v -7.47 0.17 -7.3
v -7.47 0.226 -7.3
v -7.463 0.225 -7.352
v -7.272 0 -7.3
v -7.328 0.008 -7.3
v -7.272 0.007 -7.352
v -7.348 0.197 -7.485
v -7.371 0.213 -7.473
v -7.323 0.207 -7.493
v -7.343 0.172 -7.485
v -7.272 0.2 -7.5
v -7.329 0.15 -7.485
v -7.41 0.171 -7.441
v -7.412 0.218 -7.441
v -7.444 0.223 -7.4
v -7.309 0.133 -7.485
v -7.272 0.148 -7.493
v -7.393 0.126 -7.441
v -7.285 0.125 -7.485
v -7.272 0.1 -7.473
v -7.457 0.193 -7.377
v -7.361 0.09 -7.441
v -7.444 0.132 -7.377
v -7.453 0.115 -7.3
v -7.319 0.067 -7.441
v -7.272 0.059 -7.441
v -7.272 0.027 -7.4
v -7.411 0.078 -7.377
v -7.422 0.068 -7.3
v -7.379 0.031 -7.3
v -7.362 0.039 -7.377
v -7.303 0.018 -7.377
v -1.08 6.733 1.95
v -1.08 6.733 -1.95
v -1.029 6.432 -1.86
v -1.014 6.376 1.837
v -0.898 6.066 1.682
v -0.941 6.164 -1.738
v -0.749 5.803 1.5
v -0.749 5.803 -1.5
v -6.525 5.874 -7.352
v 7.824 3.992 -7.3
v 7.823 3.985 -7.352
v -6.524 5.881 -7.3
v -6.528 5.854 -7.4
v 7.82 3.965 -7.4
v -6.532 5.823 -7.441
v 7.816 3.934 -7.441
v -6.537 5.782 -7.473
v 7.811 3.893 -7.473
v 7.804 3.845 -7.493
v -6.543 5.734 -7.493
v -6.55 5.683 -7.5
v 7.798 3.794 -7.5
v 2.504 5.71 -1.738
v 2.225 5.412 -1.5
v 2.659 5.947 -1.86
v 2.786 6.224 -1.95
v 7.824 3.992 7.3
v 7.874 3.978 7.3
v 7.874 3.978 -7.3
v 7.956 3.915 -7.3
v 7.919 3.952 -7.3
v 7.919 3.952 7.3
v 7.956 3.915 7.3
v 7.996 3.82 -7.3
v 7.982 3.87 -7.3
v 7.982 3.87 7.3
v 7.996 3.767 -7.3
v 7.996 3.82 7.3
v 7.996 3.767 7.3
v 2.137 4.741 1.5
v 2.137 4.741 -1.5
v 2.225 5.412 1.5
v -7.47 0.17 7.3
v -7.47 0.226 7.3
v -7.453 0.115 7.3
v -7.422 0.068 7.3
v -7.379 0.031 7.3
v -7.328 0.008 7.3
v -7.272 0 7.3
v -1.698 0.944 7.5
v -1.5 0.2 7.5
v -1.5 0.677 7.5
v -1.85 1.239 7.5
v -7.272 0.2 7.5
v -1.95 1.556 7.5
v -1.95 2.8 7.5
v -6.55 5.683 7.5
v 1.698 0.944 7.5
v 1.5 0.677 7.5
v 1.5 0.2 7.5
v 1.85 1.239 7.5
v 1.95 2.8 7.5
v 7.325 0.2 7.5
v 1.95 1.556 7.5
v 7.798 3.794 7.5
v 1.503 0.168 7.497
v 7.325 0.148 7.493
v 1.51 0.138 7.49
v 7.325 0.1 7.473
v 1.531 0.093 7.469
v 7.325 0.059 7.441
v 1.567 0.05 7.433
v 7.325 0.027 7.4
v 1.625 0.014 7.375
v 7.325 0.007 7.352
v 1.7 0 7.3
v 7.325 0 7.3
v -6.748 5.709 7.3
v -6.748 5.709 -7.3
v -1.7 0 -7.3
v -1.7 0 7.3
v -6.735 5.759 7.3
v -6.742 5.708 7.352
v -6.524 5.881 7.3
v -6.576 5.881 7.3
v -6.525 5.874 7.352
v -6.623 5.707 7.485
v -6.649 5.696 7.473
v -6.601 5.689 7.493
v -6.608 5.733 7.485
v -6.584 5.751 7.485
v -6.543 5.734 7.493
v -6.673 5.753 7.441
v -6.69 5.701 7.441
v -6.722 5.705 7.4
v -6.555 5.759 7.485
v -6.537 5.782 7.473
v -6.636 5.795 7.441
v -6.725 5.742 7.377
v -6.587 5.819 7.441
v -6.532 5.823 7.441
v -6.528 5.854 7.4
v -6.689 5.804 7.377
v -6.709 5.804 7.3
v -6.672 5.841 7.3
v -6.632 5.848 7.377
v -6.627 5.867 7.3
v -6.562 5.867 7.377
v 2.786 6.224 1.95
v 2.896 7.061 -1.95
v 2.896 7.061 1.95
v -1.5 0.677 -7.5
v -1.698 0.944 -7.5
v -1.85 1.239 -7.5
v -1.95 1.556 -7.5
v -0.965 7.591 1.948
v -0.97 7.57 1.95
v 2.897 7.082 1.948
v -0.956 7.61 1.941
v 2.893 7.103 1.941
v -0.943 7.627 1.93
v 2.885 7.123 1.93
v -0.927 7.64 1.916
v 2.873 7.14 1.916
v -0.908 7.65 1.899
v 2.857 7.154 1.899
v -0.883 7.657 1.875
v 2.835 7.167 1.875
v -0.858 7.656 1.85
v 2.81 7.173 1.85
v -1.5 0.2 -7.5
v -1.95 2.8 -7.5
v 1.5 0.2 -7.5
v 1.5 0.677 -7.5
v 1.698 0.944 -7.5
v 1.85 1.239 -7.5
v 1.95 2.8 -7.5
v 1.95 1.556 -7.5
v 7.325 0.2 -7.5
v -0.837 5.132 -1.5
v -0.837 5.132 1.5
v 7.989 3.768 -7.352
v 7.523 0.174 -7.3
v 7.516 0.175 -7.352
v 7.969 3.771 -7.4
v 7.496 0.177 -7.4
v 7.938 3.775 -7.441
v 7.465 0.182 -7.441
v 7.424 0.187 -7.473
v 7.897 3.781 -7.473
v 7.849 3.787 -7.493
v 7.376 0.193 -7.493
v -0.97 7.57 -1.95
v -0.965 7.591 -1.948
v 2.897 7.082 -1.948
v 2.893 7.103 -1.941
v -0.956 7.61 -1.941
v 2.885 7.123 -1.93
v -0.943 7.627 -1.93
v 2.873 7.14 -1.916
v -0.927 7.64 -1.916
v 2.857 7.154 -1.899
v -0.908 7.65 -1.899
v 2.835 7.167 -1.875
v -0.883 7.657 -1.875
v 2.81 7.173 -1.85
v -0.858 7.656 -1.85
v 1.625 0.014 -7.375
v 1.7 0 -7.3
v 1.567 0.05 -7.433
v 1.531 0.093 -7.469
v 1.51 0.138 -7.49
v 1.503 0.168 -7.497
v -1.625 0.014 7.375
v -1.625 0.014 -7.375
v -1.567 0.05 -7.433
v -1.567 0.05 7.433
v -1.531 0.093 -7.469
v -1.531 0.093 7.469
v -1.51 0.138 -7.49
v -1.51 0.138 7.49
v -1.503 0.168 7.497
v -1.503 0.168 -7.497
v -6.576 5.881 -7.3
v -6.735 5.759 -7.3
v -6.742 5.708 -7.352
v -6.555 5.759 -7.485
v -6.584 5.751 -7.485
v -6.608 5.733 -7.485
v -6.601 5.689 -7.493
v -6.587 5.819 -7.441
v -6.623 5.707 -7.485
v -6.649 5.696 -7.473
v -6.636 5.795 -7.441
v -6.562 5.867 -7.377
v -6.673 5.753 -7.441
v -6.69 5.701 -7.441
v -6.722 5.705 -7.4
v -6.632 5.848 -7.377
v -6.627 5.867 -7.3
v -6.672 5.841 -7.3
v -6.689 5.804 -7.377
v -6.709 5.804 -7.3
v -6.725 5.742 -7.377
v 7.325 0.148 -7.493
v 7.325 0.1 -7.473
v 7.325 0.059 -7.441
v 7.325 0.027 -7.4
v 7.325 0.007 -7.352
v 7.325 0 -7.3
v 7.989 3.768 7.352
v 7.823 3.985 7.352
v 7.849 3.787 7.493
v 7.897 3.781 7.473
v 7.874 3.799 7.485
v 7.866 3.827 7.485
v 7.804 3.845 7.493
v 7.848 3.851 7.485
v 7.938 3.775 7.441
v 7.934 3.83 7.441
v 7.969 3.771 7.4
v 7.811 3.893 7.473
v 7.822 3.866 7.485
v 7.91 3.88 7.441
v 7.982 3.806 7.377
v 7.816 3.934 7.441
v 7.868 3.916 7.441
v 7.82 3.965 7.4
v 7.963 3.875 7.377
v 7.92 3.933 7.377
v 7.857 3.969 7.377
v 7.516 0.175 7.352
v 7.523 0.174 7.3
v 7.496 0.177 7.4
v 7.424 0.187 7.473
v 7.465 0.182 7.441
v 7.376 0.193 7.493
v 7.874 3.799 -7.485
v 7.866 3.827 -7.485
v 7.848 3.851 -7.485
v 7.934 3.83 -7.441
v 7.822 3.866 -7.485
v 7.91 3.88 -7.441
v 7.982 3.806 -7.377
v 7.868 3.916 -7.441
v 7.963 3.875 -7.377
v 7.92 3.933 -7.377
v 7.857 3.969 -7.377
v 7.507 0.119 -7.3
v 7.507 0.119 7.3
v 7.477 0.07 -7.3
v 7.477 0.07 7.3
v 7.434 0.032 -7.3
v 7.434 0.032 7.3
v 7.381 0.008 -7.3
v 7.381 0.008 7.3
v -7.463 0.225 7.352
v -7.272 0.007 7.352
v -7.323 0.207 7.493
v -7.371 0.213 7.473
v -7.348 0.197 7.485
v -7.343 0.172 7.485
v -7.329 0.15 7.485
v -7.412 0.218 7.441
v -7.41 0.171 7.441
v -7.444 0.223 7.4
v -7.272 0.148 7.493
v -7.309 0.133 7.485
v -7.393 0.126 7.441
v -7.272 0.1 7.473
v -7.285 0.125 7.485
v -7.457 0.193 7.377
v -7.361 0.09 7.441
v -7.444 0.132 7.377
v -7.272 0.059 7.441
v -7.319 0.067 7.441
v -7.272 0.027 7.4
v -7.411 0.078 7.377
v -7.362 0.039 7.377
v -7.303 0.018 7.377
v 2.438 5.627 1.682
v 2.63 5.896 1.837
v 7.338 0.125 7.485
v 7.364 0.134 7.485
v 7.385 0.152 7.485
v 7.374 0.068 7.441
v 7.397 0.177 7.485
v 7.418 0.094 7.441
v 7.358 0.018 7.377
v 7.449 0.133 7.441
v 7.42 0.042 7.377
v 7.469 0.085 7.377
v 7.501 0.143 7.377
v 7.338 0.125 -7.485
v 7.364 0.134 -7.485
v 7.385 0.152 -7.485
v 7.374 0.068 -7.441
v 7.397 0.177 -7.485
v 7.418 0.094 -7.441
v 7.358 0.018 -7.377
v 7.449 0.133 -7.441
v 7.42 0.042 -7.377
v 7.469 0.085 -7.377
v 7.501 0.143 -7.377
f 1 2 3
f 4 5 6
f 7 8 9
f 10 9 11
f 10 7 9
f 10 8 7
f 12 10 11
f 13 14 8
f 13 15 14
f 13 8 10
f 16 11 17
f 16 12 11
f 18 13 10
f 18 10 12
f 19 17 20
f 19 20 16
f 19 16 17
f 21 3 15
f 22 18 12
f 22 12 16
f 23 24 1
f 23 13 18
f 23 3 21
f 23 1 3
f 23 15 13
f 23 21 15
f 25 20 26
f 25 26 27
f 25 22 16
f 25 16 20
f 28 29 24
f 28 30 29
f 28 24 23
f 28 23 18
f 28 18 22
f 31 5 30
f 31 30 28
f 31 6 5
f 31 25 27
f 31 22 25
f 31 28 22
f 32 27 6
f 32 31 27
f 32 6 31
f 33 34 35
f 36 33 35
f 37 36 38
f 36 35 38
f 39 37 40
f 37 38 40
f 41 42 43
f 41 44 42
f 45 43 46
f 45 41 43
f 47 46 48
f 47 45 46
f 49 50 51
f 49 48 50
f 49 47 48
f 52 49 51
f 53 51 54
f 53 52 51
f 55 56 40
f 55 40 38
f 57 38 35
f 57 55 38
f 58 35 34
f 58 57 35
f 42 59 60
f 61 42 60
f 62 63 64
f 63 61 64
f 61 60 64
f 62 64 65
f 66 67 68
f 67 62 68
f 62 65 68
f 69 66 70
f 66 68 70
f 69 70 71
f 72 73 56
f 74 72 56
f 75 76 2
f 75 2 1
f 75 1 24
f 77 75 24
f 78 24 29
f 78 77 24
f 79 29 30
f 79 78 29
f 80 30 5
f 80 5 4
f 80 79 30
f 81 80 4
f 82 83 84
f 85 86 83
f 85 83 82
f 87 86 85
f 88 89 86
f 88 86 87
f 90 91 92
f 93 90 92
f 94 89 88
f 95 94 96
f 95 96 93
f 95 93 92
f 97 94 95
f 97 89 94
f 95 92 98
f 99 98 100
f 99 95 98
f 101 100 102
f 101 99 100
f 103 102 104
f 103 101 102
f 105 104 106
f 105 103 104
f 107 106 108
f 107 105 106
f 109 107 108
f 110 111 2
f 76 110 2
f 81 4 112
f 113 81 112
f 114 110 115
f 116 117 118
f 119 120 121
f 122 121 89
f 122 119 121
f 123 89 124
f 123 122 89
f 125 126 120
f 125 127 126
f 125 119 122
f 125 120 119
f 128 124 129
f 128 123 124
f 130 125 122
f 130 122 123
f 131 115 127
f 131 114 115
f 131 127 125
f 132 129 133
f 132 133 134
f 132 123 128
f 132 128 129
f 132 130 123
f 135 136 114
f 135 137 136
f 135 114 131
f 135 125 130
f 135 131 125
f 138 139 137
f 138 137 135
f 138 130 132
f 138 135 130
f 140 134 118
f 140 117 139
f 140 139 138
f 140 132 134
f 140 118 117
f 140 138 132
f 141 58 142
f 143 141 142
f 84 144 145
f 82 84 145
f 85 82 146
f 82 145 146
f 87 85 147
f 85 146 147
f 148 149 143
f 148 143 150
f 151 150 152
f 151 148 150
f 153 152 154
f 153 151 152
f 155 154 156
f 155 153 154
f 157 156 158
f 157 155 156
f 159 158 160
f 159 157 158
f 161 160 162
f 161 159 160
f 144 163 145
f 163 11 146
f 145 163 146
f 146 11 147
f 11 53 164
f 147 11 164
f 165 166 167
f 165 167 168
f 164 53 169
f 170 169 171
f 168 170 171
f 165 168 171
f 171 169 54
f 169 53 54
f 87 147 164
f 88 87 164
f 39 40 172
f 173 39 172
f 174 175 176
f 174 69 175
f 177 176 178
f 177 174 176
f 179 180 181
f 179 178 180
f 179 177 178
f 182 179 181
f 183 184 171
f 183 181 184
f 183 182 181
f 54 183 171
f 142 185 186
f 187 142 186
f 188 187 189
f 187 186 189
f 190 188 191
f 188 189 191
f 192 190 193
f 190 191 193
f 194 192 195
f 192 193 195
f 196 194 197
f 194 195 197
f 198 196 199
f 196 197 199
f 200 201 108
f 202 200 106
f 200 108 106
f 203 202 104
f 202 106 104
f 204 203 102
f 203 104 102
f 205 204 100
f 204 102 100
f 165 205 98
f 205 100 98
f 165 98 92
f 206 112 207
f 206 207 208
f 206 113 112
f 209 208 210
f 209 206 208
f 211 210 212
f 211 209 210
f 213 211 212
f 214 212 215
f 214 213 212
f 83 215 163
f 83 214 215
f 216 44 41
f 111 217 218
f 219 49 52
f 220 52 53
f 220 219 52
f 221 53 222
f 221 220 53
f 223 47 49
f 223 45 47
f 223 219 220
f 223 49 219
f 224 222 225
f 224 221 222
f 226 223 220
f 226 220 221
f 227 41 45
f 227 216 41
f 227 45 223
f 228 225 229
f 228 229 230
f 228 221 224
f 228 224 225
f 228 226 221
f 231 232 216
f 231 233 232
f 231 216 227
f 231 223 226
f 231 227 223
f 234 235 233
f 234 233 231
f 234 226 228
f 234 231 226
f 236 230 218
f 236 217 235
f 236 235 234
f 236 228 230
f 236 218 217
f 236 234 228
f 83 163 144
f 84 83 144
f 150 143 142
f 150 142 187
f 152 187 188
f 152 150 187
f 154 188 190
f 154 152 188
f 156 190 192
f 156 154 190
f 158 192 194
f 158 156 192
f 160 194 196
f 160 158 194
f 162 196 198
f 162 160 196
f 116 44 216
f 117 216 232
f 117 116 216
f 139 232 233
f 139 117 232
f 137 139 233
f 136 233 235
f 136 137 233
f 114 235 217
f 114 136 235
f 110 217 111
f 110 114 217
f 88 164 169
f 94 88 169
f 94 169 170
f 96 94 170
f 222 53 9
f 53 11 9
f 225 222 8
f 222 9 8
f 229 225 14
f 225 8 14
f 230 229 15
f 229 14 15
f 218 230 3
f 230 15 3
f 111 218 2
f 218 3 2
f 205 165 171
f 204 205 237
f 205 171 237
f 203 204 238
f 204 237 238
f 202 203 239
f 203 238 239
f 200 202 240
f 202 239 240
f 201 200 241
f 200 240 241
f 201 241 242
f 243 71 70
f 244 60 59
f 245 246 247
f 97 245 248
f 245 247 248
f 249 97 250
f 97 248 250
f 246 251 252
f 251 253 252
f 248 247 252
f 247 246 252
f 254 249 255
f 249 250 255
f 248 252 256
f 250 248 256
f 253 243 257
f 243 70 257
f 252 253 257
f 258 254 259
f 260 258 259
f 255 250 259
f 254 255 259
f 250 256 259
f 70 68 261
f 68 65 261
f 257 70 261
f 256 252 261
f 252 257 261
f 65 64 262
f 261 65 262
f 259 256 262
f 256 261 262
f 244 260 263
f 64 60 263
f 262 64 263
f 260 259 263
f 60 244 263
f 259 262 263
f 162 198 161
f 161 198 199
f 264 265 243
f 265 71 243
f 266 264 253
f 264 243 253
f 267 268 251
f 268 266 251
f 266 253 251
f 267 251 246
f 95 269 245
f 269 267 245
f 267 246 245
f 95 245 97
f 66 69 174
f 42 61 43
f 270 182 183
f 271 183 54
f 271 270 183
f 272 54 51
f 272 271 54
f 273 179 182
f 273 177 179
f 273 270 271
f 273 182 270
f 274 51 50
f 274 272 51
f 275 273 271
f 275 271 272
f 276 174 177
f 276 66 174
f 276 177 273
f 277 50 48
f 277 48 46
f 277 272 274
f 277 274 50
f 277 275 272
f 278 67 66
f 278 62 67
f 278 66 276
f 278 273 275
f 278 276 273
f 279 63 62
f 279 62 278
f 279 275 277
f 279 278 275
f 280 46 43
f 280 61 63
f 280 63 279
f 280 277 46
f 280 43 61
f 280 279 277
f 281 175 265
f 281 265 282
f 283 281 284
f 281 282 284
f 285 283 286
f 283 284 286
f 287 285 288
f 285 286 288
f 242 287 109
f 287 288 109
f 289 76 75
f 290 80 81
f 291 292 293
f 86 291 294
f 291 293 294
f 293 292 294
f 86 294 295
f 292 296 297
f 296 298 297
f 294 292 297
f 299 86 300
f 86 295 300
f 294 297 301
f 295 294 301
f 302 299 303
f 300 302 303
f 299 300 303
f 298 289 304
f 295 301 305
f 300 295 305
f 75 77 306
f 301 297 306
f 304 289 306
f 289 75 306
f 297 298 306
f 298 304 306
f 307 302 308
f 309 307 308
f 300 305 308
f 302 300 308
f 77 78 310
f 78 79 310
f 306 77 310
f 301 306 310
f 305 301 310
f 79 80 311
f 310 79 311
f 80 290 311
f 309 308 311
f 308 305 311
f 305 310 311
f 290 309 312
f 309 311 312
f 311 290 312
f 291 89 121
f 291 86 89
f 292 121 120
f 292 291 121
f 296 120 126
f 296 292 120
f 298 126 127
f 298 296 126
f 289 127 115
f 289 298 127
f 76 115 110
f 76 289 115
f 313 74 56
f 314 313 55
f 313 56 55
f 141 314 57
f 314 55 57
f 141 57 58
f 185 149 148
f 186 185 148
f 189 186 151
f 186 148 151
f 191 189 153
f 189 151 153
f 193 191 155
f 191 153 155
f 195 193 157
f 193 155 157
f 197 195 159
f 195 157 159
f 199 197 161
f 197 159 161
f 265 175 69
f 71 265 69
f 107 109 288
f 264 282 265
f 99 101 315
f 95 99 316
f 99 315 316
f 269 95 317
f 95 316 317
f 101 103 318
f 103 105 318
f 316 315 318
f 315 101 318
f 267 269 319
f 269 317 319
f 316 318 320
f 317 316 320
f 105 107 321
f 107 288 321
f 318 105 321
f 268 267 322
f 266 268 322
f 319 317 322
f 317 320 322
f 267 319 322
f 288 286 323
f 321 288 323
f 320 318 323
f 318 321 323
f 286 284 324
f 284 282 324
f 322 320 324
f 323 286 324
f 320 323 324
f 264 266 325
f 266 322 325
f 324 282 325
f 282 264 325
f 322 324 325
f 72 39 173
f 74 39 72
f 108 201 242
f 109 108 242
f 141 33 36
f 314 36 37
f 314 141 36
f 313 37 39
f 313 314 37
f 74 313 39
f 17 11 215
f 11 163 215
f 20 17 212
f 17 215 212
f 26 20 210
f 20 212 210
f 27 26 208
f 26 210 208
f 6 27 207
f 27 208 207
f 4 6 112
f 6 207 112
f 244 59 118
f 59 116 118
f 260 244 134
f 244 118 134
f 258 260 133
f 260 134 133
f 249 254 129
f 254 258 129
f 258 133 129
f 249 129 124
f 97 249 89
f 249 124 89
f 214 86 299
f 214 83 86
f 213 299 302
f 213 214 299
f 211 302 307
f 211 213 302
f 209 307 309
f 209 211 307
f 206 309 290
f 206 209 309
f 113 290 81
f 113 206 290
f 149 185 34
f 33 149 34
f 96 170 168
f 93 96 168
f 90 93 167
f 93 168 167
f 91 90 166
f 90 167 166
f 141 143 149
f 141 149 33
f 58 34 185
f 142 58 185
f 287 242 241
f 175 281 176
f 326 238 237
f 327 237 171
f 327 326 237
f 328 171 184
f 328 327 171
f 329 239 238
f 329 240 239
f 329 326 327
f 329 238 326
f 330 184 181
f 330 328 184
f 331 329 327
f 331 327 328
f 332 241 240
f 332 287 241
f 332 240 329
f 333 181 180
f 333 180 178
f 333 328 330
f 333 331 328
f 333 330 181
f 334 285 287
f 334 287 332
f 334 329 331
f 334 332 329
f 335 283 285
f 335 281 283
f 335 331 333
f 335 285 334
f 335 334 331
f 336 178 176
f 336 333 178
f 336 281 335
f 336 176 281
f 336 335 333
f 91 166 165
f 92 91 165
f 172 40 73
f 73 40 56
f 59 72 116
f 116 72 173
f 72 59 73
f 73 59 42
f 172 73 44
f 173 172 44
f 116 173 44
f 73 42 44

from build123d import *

# Parameters (mm, degrees)
EXTRUDE_1_DEPTH      = 7.5
EXTRUDE_1_DEPTH_BACK = 7.5
EXTRUDE_2_DEPTH      = 1.5
EXTRUDE_2_DEPTH_BACK = 1.5
EXTRUDE_3_DEPTH      = 2
EXTRUDE_3_DEPTH_BACK = 2
CUT_EXTRUDE_1_DEPTH  = 15.42315829
FILLET_1_R           = 0.2
FILLET_2_R           = 0.1


with BuildPart() as part:
    # 草图1 → 凸台-拉伸1 (new, two sides: drawn at the far end of the back side and taken through both)
    with BuildSketch(Plane.XY.offset(-EXTRUDE_1_DEPTH_BACK)):
        with BuildLine():
            Line((-7.5, 0), (-1.5, 0))
            Line((-1.5, 0), (-1.5, 0.677124344))
            ThreePointArc((-1.5, 0.677124344), (-1.780042303, 1.088161527), (-1.95, 1.555590279))
            Line((-1.95, 1.555590279), (-1.95, 2.8))
            Line((-1.95, 2.8), (1.95, 2.8))
            Line((1.95, 2.8), (1.95, 1.555590279))
            ThreePointArc((1.95, 1.555590279), (1.780042303, 1.088161527), (1.5, 0.677124344))
            Line((1.5, 0.677124344), (1.5, 0))
            Line((1.5, 0), (7.5, 0))
            Line((7.5, 0), (8.022104769, 3.965779445))
            Line((8.022104769, 3.965779445), (-6.722338928, 5.906922284))
            Line((-6.722338928, 5.906922284), (-7.5, 0))
        make_face()
    extrude(amount=EXTRUDE_1_DEPTH + EXTRUDE_1_DEPTH_BACK)

    # 草图2 → 凸台-拉伸2 (add, two sides: drawn at the far end of the back side and taken through both)
    with BuildSketch(Plane.XY.offset(-EXTRUDE_2_DEPTH_BACK)):
        Polygon((-0.837284372, 5.132140153), (2.137050212, 4.740561576), (2.267576405, 5.732006438), (-0.70675818, 6.123585014), align=None)
    extrude(amount=EXTRUDE_2_DEPTH + EXTRUDE_2_DEPTH_BACK)

    # 草图3 → 凸台-拉伸3 (add, two sides: drawn at the far end of the back side and taken through both)
    with BuildSketch(Plane.XY.offset(-EXTRUDE_3_DEPTH_BACK)):
        with BuildLine():
            Line((-0.957119079, 7.669489093), (-1.080389284, 6.733158928))
            ThreePointArc((-1.080389284, 6.733158928), (-0.972897293, 6.247545163), (-0.748901909, 5.803471605))
            Line((-0.748901909, 5.803471605), (2.225432675, 5.411893028))
            ThreePointArc((2.225432675, 5.411893028), (2.556730295, 5.782860875), (2.786245676, 6.224106778))
            Line((2.786245676, 6.224106778), (2.909515881, 7.160436943))
            Line((2.909515881, 7.160436943), (-0.957119079, 7.669489093))
        make_face()
    extrude(amount=EXTRUDE_3_DEPTH + EXTRUDE_3_DEPTH_BACK)

    # 草图4 → 切除-拉伸1 (cut, through all)
    with BuildSketch(Plane(origin=(1.93331748, -0.254526075, 0), x_dir=(0, 0, -1), z_dir=(0.9914448613738126, -0.13052619222003545, 0))):
        with BuildLine():
            Line((1.95, 7.478946442), (2, 7.478946442))
            Line((2, 7.478946442), (2, 5.656070786))
            Line((2, 5.656070786), (1.5, 5.656070786))
            ThreePointArc((1.5, 5.656070786), (1.780042303, 6.067107969), (1.95, 6.534536721))
            Line((1.95, 6.534536721), (1.95, 7.478946442))
        make_face()
        with BuildLine():
            Line((-1.95, 7.478946442), (-1.95, 6.534536721))
            ThreePointArc((-1.95, 6.534536721), (-1.780042303, 6.067107969), (-1.5, 5.656070786))
            Line((-1.5, 5.656070786), (-2, 5.656070786))
            Line((-2, 5.656070786), (-2, 7.478946442))
            Line((-2, 7.478946442), (-1.95, 7.478946442))
        make_face()
    extrude(amount=-CUT_EXTRUDE_1_DEPTH, mode=Mode.SUBTRACT)

    # 圆角1
    fillet_1_edges = [part.edges().sort_by_distance(p)[0] for p in [
        (-6.722338928, 5.906922284, 0),
        (8.022104769, 3.965779445, 0),
        (7.5, 0, 0),
        (1.5, 0, 0),
        (-1.5, 0, 0),
        (-7.5, 0, 0),
        (4.5, 0, -7.5),
        (-7.111169464, 2.953461142, 7.5),
        (-4.5, 0, 7.5),
        (7.761052384, 1.982889723, -7.5),
        (4.5, 0, 7.5),
        (7.761052384, 1.982889723, 7.5),
        (0.64988292, 4.936350865, 7.5),
        (0.64988292, 4.936350865, -7.5),
        (-7.111169464, 2.953461142, -7.5),
        (-4.5, 0, -7.5),
    ]]
    fillet(fillet_1_edges, radius=FILLET_1_R)

    # 圆角2
    fillet_2_edges = [part.edges().sort_by_distance(p)[0] for p in [
        (2.909515881, 7.160436943, 0),
        (-0.957119079, 7.669489093, 0),
        (0.976198401, 7.414963018, -1.95),
        (0.976198401, 7.414963018, 1.95),
    ]]
    fillet(fillet_2_edges, radius=FILLET_2_R)


solid = part.part
